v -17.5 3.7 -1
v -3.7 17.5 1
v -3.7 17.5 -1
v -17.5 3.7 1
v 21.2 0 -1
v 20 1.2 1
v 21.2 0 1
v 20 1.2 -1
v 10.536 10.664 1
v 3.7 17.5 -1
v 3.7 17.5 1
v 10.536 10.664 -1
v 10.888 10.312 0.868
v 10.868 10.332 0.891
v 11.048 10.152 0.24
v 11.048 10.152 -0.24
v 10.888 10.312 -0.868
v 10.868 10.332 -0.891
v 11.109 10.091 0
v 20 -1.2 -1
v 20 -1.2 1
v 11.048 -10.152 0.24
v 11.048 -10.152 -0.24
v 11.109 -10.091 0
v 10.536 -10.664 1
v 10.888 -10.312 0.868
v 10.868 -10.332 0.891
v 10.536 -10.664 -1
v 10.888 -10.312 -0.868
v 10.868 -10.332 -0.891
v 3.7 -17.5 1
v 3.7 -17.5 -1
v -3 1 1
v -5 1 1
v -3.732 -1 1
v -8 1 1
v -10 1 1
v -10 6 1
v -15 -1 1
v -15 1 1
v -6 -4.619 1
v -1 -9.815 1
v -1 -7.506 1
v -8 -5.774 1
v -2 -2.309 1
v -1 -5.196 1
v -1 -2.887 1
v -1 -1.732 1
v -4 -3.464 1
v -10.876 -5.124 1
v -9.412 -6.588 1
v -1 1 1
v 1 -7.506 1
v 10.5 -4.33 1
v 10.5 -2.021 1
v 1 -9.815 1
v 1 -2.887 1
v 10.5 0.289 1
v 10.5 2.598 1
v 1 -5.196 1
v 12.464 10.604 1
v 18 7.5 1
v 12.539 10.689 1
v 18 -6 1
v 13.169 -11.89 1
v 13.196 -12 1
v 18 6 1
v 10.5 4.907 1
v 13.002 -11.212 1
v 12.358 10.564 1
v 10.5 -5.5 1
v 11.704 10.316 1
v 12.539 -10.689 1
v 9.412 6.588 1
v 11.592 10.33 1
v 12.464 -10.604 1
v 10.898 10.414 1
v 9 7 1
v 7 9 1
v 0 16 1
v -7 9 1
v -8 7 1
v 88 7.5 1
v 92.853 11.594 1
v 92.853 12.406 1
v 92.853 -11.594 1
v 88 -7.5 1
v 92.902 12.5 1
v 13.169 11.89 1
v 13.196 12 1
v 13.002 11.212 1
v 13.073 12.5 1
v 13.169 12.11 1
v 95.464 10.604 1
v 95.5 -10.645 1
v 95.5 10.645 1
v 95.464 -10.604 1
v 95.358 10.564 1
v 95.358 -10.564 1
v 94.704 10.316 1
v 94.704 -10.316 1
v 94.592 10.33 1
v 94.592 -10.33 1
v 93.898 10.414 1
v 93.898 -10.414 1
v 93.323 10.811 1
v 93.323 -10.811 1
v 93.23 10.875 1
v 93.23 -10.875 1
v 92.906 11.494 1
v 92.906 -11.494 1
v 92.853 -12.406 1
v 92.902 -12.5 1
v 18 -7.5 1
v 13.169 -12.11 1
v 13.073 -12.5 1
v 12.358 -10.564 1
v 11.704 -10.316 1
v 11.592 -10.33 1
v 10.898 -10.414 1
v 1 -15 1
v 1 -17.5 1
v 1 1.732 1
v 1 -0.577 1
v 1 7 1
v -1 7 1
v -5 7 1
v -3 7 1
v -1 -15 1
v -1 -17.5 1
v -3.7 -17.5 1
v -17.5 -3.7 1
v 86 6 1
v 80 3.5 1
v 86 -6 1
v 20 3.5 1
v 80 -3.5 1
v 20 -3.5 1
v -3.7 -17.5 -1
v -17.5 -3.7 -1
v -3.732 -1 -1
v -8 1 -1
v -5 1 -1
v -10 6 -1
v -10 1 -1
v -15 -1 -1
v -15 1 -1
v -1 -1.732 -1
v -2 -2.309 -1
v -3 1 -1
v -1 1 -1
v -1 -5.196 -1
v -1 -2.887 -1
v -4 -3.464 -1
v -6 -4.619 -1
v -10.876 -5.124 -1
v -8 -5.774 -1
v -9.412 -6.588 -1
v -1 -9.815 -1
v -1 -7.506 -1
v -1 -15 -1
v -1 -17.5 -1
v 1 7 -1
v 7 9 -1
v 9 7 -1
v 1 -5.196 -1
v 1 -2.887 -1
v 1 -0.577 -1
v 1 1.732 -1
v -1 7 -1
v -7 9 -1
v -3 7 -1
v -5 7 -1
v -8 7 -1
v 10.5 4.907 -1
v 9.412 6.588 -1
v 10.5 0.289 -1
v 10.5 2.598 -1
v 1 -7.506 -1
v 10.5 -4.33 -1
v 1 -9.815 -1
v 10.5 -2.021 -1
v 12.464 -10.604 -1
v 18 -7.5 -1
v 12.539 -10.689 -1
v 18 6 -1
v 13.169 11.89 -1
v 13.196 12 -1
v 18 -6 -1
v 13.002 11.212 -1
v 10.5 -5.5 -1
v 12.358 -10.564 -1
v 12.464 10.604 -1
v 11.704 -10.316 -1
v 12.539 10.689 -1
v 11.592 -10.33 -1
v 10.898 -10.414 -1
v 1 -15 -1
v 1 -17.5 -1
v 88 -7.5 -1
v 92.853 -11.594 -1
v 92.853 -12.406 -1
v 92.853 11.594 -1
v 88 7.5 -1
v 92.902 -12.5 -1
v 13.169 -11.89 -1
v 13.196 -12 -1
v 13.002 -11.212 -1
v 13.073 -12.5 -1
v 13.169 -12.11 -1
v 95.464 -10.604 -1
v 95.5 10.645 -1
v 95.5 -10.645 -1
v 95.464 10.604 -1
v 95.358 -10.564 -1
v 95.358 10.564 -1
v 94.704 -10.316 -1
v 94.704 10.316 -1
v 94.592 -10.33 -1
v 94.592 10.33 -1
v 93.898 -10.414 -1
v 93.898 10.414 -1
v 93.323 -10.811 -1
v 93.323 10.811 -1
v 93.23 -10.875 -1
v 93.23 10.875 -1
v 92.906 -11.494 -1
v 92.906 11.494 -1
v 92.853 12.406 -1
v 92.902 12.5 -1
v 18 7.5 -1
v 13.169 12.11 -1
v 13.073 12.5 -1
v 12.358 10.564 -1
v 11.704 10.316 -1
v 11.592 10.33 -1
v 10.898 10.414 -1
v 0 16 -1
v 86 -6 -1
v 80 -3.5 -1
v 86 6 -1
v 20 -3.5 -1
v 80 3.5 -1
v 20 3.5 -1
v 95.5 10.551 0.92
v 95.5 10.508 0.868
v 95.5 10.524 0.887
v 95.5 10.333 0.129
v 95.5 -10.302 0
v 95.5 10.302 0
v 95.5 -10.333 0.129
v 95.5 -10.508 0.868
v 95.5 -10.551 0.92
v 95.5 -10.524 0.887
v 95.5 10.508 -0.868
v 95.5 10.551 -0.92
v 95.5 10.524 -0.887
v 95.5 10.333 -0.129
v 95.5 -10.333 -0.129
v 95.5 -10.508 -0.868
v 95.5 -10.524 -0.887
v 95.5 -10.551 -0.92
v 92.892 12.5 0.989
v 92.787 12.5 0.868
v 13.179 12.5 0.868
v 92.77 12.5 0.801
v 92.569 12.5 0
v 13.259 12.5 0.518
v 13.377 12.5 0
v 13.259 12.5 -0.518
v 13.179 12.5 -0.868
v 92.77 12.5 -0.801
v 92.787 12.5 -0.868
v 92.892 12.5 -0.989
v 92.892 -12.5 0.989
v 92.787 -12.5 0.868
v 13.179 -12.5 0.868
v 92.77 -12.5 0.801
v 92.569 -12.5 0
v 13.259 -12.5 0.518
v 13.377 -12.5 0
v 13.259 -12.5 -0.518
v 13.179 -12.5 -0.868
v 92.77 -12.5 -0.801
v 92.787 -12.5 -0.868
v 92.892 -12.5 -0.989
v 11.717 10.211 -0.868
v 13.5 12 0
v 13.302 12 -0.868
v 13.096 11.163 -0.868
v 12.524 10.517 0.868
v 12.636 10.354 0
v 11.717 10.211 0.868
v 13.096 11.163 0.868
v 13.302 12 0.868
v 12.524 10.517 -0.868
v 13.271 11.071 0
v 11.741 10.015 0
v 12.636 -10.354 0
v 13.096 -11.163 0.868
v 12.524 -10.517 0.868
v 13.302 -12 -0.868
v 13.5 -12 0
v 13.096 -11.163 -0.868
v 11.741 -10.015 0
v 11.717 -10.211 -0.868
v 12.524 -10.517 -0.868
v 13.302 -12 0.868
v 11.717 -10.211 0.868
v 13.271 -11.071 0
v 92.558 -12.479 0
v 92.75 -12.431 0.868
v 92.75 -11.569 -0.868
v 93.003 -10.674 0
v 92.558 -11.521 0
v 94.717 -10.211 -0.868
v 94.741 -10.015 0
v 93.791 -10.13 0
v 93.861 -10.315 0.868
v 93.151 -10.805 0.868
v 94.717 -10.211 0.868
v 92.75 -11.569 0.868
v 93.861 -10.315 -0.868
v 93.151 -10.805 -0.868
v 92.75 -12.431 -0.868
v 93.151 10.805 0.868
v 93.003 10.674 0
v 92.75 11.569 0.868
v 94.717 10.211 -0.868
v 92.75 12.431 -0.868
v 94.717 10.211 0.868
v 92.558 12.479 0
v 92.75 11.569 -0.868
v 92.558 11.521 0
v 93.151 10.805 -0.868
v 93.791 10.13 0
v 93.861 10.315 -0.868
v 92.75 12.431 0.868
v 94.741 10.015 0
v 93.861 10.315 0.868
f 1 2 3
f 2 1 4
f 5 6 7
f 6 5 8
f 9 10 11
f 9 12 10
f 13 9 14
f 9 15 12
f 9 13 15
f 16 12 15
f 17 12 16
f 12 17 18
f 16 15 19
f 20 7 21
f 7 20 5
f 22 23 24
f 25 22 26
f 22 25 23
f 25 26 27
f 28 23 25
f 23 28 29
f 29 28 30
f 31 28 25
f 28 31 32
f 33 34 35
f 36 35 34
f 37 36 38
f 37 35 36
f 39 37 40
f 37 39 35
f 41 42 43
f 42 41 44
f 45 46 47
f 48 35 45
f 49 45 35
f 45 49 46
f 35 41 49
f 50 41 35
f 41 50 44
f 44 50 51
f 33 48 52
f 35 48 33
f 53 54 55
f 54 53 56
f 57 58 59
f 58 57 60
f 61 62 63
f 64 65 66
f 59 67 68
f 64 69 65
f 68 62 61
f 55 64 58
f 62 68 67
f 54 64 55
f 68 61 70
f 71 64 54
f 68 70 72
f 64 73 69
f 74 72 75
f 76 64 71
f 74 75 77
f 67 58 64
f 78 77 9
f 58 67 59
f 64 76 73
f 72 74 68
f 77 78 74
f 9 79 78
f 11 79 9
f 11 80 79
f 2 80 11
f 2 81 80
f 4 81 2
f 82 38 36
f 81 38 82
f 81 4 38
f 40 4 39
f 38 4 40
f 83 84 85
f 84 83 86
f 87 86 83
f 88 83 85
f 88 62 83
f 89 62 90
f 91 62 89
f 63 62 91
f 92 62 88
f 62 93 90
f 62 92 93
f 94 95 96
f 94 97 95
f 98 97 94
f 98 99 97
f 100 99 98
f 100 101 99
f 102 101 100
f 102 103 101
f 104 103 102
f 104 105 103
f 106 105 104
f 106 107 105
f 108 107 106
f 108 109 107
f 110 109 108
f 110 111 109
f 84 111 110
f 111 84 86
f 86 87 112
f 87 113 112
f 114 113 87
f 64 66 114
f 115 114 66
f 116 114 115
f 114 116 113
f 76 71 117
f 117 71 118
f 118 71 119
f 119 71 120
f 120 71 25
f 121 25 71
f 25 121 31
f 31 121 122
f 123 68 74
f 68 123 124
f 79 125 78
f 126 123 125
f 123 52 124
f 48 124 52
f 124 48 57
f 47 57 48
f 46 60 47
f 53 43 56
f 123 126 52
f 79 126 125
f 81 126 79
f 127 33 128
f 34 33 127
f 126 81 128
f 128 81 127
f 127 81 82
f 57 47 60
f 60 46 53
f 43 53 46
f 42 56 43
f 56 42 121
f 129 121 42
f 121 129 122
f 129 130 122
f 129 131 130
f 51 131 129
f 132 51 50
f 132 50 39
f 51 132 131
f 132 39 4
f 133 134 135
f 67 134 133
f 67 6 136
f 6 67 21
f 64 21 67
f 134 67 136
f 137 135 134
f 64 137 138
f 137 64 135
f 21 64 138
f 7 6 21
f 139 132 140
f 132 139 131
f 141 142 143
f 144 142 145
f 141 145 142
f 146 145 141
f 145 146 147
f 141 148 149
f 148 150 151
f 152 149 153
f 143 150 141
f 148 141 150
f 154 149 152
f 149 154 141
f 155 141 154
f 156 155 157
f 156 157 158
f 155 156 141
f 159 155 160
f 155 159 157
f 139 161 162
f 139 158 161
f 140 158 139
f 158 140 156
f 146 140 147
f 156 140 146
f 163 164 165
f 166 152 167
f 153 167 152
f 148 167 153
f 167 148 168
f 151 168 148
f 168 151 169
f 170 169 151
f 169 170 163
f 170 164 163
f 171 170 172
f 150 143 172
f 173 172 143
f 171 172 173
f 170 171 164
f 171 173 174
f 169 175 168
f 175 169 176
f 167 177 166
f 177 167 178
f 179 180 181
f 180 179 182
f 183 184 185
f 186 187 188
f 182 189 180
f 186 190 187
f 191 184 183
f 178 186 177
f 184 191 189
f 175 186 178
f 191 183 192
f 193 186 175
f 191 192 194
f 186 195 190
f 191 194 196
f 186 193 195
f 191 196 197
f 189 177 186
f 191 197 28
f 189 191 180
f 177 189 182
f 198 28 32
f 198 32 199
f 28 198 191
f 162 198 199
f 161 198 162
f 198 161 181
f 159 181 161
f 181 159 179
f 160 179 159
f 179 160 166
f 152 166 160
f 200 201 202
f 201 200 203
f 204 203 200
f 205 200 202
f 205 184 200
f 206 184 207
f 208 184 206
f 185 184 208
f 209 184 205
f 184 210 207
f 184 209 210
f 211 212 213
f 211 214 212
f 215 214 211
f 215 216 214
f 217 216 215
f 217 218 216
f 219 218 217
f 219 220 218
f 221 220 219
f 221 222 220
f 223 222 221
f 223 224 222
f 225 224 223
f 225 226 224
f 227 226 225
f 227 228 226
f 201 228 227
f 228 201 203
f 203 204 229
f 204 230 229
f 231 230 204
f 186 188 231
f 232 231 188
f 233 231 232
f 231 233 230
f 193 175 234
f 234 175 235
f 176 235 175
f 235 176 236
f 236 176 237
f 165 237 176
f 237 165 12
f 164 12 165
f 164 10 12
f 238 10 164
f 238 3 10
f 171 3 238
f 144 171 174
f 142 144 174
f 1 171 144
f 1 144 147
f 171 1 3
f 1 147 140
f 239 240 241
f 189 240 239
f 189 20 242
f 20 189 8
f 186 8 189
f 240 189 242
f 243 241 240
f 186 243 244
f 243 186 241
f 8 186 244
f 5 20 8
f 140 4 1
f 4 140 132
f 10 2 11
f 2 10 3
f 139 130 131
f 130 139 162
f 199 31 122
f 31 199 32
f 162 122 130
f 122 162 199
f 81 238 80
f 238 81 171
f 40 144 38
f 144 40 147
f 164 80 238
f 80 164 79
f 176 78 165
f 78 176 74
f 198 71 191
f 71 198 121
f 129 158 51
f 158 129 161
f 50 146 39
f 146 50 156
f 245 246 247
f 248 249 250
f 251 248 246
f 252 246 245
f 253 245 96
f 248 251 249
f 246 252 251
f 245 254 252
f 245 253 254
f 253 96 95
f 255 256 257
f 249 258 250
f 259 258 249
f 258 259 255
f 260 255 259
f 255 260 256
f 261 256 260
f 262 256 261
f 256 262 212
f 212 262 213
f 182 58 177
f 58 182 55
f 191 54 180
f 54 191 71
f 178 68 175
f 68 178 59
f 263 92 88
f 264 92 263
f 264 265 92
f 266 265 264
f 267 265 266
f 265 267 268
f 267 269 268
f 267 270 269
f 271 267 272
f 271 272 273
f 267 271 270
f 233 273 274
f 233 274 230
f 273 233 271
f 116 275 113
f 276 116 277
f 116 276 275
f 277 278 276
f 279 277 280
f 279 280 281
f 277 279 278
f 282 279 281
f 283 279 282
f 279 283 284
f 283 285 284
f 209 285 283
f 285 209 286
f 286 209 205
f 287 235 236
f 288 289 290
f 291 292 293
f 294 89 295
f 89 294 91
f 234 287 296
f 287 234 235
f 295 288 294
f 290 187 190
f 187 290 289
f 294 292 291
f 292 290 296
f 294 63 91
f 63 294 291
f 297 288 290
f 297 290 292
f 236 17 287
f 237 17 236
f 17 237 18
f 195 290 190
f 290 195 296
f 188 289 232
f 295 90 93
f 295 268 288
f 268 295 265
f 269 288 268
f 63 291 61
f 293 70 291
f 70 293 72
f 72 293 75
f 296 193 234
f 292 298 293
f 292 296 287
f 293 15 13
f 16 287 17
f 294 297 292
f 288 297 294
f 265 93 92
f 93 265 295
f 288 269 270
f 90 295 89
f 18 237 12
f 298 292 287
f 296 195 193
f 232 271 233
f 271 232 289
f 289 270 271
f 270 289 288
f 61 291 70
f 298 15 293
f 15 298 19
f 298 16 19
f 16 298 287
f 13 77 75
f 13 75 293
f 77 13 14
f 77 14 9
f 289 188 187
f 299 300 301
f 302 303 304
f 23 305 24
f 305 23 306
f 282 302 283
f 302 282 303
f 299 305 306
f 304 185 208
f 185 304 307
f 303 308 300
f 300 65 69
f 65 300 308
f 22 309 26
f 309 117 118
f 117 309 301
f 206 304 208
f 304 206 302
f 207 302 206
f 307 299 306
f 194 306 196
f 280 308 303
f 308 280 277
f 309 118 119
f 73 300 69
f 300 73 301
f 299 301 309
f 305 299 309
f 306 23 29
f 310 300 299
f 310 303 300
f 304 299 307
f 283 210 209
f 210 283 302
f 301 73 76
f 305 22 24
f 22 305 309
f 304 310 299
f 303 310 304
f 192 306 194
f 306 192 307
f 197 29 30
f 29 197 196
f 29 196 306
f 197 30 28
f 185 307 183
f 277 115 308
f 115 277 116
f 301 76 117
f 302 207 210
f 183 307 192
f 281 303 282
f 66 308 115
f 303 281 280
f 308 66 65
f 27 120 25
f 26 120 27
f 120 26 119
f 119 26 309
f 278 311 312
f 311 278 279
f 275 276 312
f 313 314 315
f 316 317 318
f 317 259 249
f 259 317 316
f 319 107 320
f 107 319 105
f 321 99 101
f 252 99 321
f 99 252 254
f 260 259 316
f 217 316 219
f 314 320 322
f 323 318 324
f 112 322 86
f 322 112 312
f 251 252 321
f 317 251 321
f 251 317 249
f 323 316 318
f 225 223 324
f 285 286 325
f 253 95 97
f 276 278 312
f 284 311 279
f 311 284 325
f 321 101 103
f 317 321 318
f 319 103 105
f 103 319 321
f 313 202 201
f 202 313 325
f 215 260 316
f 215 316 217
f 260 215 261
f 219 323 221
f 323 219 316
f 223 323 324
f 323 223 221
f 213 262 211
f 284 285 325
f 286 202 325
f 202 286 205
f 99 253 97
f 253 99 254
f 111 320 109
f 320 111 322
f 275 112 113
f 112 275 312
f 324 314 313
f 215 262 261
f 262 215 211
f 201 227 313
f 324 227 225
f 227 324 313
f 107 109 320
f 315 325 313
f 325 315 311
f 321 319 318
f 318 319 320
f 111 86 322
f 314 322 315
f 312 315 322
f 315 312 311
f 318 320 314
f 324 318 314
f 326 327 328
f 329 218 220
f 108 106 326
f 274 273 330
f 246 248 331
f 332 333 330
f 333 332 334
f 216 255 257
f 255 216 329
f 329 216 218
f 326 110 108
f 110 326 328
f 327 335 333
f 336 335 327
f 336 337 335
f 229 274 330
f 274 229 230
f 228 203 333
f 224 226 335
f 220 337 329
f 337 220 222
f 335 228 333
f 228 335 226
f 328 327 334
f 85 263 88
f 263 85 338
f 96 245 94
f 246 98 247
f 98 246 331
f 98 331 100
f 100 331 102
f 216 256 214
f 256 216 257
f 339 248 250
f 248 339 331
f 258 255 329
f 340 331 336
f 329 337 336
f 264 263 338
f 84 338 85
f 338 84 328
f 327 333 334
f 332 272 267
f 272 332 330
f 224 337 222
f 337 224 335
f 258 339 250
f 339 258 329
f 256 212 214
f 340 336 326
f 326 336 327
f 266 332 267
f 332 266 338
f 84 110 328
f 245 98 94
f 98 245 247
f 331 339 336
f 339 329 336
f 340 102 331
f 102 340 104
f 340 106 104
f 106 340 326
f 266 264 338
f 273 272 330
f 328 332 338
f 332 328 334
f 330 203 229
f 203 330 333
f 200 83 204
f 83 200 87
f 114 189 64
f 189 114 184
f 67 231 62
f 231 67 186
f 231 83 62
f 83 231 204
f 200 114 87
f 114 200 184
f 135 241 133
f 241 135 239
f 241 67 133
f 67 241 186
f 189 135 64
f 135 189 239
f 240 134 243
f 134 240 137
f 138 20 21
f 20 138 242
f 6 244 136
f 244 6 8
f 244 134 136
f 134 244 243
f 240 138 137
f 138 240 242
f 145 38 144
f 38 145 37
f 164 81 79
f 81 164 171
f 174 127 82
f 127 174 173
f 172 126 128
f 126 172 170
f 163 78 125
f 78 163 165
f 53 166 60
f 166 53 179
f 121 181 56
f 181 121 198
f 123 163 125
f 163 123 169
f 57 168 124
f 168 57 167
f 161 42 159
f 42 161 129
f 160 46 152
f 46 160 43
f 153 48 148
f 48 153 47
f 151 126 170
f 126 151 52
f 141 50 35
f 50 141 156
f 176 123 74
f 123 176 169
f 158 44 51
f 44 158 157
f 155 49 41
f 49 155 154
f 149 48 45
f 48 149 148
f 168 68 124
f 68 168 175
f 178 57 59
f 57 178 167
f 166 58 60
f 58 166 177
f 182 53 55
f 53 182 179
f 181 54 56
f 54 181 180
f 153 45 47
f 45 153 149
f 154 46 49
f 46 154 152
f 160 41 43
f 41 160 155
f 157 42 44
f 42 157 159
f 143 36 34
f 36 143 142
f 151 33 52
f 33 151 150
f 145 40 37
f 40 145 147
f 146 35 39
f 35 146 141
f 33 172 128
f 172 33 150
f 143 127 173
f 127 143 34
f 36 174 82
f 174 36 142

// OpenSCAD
//design an object: Bookmark
//by noahs2020
//v.1.3 24 Jan 2019





//the top------------------------------------

difference(){

difference(){
   
    difference(){
      
        difference(){

cylinder(2,21.2,21.2,$fn=4, center=true);

translate([-20,0,0]) cube([5,10,3], center=true) ;
}

translate([0,20,0]) cube([10,5,3], center=true) ;}

translate([0,-20,0]) cube([10,5,3], center=true) ;}

cylinder(4,16,16,$fn=4, center=true);
}


//the main body-----------------------------------

difference(){

difference(){

difference(){
    
    difference(){
        
        difference(){

translate([53,0,0]) cube([85, 25,2], center=true);

translate([11.5,12,0]) sphere($fn = 0, $fa = 12, $fs = 1, r = 2);}

translate([11.5,-12,0]) sphere($fn = 0, $fa = 12, $fs = 1, r = 2);}

translate([94.5,-12,0]) sphere($fn = 0, $fa = 12, $fs = 1, r = 2);}

translate([94.5,12,0]) sphere($fn = 0, $fa = 12, $fs = 1, r = 2);}


translate([53,0,0]) cube([70, 15,4], center=true);
   
}
difference(){

translate([50,0,0]) cube([72, 12,2], center=true);

translate([50,0,0]) cube([60,7,4], center=true);
}

//inside of the top-------------------------------

rotate([0,0,0]) translate([0,8,0]) cube([20,2,2], center=true);

rotate([0,0,-90]) translate([5,0,0]) cube([25,2,2], center=true);

rotate([0,0,30]) translate([1,0,0]) cube([27,2,2], center=true);

rotate([0,0,30]) translate([7,-4,0]) cube([18,2,2], center=true);

rotate([0,0,30]) translate([6,-8,0]) cube([22,2,2], center=true);

rotate([0,0,-30]) translate([0.3,-4,0]) cube([5,2,2], center=true);

rotate([0,0,-30]) translate([0.3,-8,0]) cube([10,2,2], center=true);

rotate([0,0,0]) translate([-8,0,0]) cube([17,2,2], center=true);

rotate([0,0,-90]) translate([-4,-4,0]) cube([10,2,2], center=true);

rotate([0,0,-90]) translate([-5,-9,0]) cube([10,2,2], center=true);
